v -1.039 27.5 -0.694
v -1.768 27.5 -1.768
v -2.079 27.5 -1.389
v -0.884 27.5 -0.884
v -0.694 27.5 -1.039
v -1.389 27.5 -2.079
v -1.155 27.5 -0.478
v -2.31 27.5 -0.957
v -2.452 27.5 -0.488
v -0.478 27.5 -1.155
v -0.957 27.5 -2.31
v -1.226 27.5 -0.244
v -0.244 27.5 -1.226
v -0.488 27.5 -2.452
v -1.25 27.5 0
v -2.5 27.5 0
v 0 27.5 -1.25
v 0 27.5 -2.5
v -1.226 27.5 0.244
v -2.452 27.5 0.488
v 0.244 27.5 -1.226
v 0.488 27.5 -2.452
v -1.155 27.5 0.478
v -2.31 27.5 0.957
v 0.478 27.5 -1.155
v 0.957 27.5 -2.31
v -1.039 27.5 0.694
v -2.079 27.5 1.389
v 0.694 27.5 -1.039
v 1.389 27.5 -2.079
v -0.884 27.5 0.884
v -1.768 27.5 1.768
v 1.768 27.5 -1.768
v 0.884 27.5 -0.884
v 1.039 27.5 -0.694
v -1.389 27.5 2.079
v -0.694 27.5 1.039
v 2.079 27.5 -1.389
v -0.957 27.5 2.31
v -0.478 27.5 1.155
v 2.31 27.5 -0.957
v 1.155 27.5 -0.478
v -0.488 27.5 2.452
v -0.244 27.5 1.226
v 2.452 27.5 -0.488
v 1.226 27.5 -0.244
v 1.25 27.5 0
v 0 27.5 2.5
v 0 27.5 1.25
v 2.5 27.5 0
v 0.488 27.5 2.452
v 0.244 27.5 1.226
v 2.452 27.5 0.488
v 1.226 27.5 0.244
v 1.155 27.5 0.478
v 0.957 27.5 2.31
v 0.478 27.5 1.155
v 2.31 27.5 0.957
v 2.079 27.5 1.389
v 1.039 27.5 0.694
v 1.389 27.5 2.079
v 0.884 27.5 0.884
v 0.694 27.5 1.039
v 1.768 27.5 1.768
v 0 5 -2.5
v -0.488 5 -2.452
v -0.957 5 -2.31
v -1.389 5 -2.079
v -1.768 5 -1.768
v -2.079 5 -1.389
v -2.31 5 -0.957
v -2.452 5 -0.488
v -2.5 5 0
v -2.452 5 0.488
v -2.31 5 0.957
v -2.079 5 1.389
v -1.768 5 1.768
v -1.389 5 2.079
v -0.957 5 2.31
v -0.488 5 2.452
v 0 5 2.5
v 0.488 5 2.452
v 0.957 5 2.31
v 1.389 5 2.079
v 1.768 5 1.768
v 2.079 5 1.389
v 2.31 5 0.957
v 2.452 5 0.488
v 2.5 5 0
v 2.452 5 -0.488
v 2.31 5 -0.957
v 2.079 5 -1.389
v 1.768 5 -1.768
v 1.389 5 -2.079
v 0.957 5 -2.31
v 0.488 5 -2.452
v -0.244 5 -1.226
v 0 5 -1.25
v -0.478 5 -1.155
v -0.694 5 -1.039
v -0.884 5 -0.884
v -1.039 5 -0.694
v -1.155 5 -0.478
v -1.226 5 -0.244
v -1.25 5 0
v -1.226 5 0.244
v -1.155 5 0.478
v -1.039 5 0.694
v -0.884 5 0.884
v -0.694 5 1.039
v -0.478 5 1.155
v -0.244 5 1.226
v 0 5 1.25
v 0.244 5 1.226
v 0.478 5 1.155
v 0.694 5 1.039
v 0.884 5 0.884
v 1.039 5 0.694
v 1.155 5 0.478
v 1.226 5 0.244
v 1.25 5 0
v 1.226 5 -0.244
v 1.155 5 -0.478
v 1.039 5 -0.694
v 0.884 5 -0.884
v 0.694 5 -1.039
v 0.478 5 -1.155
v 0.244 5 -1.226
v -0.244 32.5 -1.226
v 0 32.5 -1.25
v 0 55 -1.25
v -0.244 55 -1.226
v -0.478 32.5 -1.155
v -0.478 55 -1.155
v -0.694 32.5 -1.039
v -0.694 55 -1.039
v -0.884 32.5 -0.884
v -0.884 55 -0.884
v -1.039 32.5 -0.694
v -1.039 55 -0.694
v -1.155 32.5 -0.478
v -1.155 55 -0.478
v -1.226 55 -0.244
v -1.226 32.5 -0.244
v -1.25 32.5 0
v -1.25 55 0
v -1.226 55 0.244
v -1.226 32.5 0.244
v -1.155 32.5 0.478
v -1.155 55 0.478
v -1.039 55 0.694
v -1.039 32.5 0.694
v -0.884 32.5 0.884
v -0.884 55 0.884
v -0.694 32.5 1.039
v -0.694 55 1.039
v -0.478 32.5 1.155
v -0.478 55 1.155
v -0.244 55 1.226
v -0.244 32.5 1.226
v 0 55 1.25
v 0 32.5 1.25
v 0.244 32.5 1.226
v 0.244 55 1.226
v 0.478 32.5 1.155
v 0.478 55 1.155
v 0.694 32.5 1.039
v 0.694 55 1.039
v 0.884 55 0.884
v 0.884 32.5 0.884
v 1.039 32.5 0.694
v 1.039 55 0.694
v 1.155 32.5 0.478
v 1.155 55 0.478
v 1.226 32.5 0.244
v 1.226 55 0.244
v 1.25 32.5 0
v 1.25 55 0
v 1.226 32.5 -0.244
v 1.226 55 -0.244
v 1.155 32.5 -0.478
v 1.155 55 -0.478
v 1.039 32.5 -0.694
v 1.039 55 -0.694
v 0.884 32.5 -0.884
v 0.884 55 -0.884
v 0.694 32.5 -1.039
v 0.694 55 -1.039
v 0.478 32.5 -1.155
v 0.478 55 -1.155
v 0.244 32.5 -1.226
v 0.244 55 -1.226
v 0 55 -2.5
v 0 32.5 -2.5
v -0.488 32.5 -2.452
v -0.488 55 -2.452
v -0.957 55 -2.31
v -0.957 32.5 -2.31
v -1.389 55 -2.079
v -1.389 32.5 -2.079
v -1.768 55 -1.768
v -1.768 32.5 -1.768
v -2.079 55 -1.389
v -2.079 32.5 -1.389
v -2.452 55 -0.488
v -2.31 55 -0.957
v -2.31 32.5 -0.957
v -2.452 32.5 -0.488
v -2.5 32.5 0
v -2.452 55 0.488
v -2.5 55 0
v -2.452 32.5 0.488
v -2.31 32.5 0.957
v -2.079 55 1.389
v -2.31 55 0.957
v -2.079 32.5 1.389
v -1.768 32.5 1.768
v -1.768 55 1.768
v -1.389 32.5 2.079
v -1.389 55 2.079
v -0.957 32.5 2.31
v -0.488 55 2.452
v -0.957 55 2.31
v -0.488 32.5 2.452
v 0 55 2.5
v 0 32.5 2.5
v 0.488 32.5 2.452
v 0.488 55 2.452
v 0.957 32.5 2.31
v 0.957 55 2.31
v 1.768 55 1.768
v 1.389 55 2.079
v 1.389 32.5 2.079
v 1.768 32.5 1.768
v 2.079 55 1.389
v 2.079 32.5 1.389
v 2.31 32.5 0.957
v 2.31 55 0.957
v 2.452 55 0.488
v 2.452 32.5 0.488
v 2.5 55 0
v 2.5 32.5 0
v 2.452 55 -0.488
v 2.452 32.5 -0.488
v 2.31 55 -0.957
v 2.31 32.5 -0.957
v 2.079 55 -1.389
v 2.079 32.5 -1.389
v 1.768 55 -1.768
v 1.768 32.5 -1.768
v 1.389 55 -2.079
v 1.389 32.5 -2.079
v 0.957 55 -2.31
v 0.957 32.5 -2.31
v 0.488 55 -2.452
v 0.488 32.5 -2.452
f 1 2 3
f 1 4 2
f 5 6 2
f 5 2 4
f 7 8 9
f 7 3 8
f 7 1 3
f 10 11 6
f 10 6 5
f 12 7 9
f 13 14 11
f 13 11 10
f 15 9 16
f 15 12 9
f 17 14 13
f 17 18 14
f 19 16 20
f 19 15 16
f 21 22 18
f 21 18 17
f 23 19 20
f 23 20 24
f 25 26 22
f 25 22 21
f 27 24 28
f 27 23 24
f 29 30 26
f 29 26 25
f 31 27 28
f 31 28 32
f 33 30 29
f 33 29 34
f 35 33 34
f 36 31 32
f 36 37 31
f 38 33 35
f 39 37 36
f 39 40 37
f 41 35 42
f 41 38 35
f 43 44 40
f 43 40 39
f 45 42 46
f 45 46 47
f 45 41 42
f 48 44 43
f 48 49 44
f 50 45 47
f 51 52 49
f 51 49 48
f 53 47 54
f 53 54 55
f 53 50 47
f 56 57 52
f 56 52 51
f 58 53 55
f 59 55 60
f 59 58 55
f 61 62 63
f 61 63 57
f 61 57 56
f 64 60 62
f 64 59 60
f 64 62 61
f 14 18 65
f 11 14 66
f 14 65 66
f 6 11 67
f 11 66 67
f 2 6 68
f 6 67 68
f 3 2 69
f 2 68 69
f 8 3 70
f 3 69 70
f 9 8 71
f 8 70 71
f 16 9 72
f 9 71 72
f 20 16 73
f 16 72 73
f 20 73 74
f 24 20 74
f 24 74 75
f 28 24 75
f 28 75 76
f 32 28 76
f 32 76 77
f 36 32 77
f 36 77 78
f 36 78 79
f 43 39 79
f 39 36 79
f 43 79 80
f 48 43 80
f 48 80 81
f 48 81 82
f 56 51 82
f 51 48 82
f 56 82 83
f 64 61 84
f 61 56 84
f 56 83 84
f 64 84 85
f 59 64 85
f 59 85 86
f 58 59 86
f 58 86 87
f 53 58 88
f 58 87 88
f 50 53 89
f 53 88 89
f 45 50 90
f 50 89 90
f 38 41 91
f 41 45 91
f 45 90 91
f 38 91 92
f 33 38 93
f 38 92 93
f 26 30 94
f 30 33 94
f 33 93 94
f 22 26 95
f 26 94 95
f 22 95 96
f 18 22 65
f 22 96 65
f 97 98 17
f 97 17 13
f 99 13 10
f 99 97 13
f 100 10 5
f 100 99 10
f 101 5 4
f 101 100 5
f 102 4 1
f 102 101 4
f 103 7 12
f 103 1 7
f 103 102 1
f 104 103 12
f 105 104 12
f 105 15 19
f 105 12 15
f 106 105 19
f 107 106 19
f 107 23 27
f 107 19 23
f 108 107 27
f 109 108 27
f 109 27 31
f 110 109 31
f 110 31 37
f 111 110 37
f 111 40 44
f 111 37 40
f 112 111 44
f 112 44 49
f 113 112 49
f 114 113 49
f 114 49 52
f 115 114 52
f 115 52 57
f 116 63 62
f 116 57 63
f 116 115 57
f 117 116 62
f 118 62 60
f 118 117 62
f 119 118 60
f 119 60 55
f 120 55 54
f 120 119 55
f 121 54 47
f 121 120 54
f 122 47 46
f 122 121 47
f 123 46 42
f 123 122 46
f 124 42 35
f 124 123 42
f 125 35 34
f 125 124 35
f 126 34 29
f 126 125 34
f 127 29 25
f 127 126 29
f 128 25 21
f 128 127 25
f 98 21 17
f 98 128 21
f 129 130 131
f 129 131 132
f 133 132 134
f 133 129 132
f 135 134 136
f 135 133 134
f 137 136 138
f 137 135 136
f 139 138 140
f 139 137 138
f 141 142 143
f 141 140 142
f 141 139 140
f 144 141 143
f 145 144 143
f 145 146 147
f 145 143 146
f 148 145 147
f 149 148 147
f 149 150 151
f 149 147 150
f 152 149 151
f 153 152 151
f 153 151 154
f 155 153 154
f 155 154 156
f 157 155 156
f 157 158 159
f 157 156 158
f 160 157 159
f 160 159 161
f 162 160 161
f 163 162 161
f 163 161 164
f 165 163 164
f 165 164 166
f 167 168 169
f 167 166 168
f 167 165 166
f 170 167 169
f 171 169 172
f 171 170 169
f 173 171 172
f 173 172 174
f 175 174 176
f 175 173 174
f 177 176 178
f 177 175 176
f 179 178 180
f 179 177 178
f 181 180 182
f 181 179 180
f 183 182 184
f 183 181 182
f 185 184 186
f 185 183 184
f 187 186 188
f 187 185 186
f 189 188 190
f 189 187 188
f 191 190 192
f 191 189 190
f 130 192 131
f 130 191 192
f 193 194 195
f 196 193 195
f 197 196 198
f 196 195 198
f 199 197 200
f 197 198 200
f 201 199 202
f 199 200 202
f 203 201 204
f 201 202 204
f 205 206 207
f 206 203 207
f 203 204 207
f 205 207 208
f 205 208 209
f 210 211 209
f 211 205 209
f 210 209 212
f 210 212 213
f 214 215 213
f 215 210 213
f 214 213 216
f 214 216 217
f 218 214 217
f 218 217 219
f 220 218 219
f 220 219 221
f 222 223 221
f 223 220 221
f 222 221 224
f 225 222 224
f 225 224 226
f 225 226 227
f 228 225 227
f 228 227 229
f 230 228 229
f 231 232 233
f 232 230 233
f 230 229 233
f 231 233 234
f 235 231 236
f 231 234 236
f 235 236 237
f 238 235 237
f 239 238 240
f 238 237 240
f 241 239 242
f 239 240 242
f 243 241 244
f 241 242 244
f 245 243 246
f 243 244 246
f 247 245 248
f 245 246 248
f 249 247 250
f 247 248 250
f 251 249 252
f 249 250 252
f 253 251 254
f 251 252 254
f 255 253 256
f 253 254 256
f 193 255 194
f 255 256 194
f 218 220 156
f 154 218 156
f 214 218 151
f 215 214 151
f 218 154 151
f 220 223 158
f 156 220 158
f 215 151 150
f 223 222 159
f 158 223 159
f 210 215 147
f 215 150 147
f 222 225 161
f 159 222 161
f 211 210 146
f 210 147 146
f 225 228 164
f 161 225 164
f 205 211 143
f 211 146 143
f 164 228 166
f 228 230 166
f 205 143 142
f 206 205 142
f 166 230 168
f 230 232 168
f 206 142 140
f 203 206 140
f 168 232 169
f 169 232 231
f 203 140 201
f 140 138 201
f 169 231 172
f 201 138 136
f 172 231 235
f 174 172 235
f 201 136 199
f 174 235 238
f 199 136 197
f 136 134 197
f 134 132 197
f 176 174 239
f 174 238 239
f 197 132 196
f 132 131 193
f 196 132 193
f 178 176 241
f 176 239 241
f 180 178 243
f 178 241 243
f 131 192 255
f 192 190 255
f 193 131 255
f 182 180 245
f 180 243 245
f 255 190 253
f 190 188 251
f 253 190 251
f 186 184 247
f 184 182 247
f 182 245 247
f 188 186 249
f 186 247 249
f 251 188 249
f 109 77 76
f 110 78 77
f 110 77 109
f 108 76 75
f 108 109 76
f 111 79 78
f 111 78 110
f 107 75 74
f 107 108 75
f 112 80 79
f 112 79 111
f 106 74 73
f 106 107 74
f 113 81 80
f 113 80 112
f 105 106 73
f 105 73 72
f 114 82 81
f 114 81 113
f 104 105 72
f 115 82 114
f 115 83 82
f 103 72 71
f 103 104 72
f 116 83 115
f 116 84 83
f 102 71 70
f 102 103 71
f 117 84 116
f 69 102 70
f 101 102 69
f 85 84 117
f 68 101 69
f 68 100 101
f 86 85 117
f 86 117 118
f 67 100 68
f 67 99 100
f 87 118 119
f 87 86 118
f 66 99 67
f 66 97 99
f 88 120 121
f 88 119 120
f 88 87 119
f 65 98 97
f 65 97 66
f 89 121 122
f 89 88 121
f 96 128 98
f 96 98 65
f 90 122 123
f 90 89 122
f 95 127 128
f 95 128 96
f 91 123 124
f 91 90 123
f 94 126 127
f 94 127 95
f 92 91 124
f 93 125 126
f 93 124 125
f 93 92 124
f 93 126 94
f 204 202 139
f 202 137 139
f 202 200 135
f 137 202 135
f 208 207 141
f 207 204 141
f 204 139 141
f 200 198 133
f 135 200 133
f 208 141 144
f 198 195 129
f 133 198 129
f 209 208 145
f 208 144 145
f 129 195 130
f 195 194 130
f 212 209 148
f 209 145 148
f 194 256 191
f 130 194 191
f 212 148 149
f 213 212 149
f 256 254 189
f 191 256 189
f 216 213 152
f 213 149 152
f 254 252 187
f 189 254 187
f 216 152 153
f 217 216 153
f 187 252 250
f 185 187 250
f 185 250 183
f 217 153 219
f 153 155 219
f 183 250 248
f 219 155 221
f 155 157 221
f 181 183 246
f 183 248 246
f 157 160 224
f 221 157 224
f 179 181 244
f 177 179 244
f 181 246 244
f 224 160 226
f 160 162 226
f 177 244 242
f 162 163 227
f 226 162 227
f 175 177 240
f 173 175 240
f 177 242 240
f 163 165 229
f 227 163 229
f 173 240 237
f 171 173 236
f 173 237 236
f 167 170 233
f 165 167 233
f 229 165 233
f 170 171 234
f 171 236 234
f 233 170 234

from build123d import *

# Parameters (mm, degrees)
SKETCH2_R           = 2.5
BOSS_EXTRUDE1_DEPTH = 60
CUT_EXTRUDE1_DEPTH  = 5
SKETCH6_R           = 1.25
CUT_EXTRUDE2_DEPTH  = 60
SKETCH7_W           = 5.0259895
SKETCH7_H           = 5
CUT_EXTRUDE3_DEPTH  = 25
SKETCH8_W           = 5
SKETCH8_H           = 5
CUT_EXTRUDE4_DEPTH  = 25


with BuildPart() as part:
    # Sketch2 → Boss-Extrude1 (new body)
    with BuildSketch(Plane(origin=(0, 0, 0), x_dir=(1, 0, 0), z_dir=(0, 1, 0))):
        with Locations(Location((0, 0, 0), (0, 0, 90))):
            Circle(SKETCH2_R)
    extrude(amount=BOSS_EXTRUDE1_DEPTH)

    # Sketch4 → Cut-Extrude1 (cut, symmetric)
    with BuildSketch(Plane(origin=(0, 0, 0), x_dir=(0, 0, -1), z_dir=(1, 0, 0))):
        Polygon((0, 32.5), (14.138418726, 32.5), (14.138418726, 27.5), (-5.192428116, 27.5), (-5.192428116, 32.5), align=None)
    extrude(amount=CUT_EXTRUDE1_DEPTH, both=True, mode=Mode.SUBTRACT)


with BuildPart() as cut_extrude1_piece_1:
    # of the separate pieces the step leaves, piece 1, a body of its own (cut_extrude1_pieces)
    add(part.part.solids().sort_by_distance((0, 32.5, -2.5))[0])


with BuildPart() as cut_extrude1_piece_2:
    # of the separate pieces the step leaves, piece 2, a body of its own (cut_extrude1_pieces)
    add(part.part.solids().sort_by_distance((0, 0, -2.5))[0])


with BuildPart() as cut_extrude2_tool:
    # Sketch6 → Cut-Extrude2 (new body)
    with BuildSketch(Plane(origin=(0, 0, 0), x_dir=(1, 0, 0), z_dir=(0, 1, 0))):
        with Locations(Location((0, 0, 0), (0, 0, 90))):
            Circle(SKETCH6_R)
    extrude(amount=CUT_EXTRUDE2_DEPTH)


with BuildPart() as cut_extrude1_piece_1_1:
    add(cut_extrude1_piece_1.part)

    # Cut-Extrude2: cut by cut_extrude2_tool
    add(cut_extrude2_tool.part, mode=Mode.SUBTRACT)

    # Sketch7 → Cut-Extrude3 (cut, symmetric)
    with BuildSketch(Plane(origin=(0, 0, 0), x_dir=(0, 0, -1), z_dir=(1, 0, 0))):
        with Locations((0.01299475, 57.5)):
            Rectangle(SKETCH7_W, SKETCH7_H)
    extrude(amount=CUT_EXTRUDE3_DEPTH, both=True, mode=Mode.SUBTRACT)


with BuildPart() as cut_extrude1_piece_2_1:
    add(cut_extrude1_piece_2.part)

    # Cut-Extrude2: cut by cut_extrude2_tool
    add(cut_extrude2_tool.part, mode=Mode.SUBTRACT)

    # Sketch8 → Cut-Extrude4 (cut, symmetric)
    with BuildSketch(Plane(origin=(0, 0, 0), x_dir=(0, 0, -1), z_dir=(1, 0, 0))):
        with Locations((0, 2.5)):
            Rectangle(SKETCH8_W, SKETCH8_H)
    extrude(amount=CUT_EXTRUDE4_DEPTH, both=True, mode=Mode.SUBTRACT)


solid = Compound([cut_extrude1_piece_1_1.part, cut_extrude1_piece_2_1.part])
